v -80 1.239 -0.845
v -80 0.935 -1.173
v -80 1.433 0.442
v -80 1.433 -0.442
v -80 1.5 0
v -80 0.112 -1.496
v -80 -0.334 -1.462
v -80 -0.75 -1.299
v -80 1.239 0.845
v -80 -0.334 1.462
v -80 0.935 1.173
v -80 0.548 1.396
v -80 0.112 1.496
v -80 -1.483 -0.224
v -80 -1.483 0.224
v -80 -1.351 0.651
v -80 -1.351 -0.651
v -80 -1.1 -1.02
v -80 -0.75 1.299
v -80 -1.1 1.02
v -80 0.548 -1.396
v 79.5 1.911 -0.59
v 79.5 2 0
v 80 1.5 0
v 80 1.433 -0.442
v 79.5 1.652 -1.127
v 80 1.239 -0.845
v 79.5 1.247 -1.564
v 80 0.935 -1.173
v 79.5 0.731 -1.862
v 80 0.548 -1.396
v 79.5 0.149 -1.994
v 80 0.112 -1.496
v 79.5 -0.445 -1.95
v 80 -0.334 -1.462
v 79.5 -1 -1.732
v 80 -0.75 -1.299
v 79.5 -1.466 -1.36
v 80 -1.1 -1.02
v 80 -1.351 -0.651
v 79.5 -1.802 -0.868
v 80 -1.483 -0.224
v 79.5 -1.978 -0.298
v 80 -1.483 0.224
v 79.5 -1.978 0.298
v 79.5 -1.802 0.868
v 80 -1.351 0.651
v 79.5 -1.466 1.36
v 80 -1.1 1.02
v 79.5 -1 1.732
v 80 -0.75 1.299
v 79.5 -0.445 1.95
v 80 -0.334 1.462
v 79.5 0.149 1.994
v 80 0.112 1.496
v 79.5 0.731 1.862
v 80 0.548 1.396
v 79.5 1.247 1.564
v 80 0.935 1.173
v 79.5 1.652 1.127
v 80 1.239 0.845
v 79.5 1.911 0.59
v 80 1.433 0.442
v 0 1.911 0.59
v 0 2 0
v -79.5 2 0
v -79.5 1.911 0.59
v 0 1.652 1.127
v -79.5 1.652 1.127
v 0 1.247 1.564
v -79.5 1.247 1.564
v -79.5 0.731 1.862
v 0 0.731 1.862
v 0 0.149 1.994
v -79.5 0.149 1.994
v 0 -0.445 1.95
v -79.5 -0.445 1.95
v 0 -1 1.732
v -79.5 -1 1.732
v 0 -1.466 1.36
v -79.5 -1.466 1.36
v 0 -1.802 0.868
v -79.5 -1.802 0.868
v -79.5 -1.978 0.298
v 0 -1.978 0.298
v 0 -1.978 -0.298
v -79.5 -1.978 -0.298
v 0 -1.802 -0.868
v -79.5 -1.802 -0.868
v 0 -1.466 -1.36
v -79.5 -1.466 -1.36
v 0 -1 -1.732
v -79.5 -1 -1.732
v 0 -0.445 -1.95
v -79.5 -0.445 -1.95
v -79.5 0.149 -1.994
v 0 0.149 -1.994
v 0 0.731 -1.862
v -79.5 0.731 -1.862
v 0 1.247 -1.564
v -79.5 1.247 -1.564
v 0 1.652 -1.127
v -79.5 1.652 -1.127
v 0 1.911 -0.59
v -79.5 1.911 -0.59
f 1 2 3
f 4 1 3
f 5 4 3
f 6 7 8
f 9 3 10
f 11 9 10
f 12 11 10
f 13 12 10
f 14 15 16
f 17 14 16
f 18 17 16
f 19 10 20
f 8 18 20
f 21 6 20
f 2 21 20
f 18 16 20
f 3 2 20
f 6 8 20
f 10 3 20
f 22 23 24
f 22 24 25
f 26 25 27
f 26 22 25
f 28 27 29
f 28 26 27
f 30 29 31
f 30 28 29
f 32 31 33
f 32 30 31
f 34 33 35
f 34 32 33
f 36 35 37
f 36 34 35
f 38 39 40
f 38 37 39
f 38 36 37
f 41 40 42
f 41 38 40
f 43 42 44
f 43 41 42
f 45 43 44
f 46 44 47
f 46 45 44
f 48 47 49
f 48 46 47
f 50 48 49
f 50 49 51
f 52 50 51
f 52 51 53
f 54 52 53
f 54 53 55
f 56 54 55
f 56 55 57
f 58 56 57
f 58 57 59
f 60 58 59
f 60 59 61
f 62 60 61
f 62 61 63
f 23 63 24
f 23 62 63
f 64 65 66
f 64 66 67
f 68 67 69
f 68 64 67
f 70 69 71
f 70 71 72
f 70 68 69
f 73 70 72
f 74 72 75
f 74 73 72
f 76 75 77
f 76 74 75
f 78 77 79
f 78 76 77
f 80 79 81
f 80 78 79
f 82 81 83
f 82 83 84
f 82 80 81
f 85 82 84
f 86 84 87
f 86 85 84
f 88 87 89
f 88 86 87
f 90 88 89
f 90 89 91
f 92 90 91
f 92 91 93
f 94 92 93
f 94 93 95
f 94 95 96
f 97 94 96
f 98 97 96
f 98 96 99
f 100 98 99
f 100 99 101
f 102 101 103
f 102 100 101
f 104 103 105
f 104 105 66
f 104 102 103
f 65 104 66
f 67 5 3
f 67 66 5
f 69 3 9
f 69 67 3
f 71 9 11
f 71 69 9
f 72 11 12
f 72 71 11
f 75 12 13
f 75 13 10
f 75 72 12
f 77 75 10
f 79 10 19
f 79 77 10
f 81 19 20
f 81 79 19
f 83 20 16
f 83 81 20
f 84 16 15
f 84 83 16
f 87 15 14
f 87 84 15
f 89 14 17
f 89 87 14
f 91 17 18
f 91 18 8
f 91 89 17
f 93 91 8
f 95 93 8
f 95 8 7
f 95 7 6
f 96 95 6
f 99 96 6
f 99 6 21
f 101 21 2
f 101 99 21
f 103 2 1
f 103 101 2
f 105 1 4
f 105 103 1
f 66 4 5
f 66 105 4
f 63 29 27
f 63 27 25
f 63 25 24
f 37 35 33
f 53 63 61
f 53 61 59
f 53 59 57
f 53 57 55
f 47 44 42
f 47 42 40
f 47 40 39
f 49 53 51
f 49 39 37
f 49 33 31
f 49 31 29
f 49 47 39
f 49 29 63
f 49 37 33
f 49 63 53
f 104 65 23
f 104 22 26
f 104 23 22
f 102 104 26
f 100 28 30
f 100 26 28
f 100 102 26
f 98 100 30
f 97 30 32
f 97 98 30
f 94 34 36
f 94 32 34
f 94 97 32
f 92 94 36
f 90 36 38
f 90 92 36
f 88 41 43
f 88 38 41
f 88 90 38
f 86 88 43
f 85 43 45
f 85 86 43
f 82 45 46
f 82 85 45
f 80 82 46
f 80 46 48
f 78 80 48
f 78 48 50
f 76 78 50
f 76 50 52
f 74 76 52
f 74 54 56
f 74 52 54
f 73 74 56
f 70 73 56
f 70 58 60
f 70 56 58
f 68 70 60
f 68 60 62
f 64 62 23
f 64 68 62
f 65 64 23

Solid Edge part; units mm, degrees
sketch "Sketch1" plane through (0, 0, 0) normal (1, 0, 0) x (0, 1, 0)
  circle A0 centre (0, 0) radius 2
extrude "Protrusion1" add sketch "Sketch1" along normal mid plane 160
cosmetic_thread "Thread_3" size "M4" thread depth 8
cosmetic_thread "Thread_4" size "M4" thread depth 8
chamfer "Chamfer_1" distance 0.5 angle 45 1 edges at (-80, -2, 0) measured on face at (-80, 1.2933, -1.3733)
chamfer "Chamfer_2" distance 0.5 angle 45 1 edges at (80, -2, 0) measured on face at (80, 1.2933, -1.3733)
